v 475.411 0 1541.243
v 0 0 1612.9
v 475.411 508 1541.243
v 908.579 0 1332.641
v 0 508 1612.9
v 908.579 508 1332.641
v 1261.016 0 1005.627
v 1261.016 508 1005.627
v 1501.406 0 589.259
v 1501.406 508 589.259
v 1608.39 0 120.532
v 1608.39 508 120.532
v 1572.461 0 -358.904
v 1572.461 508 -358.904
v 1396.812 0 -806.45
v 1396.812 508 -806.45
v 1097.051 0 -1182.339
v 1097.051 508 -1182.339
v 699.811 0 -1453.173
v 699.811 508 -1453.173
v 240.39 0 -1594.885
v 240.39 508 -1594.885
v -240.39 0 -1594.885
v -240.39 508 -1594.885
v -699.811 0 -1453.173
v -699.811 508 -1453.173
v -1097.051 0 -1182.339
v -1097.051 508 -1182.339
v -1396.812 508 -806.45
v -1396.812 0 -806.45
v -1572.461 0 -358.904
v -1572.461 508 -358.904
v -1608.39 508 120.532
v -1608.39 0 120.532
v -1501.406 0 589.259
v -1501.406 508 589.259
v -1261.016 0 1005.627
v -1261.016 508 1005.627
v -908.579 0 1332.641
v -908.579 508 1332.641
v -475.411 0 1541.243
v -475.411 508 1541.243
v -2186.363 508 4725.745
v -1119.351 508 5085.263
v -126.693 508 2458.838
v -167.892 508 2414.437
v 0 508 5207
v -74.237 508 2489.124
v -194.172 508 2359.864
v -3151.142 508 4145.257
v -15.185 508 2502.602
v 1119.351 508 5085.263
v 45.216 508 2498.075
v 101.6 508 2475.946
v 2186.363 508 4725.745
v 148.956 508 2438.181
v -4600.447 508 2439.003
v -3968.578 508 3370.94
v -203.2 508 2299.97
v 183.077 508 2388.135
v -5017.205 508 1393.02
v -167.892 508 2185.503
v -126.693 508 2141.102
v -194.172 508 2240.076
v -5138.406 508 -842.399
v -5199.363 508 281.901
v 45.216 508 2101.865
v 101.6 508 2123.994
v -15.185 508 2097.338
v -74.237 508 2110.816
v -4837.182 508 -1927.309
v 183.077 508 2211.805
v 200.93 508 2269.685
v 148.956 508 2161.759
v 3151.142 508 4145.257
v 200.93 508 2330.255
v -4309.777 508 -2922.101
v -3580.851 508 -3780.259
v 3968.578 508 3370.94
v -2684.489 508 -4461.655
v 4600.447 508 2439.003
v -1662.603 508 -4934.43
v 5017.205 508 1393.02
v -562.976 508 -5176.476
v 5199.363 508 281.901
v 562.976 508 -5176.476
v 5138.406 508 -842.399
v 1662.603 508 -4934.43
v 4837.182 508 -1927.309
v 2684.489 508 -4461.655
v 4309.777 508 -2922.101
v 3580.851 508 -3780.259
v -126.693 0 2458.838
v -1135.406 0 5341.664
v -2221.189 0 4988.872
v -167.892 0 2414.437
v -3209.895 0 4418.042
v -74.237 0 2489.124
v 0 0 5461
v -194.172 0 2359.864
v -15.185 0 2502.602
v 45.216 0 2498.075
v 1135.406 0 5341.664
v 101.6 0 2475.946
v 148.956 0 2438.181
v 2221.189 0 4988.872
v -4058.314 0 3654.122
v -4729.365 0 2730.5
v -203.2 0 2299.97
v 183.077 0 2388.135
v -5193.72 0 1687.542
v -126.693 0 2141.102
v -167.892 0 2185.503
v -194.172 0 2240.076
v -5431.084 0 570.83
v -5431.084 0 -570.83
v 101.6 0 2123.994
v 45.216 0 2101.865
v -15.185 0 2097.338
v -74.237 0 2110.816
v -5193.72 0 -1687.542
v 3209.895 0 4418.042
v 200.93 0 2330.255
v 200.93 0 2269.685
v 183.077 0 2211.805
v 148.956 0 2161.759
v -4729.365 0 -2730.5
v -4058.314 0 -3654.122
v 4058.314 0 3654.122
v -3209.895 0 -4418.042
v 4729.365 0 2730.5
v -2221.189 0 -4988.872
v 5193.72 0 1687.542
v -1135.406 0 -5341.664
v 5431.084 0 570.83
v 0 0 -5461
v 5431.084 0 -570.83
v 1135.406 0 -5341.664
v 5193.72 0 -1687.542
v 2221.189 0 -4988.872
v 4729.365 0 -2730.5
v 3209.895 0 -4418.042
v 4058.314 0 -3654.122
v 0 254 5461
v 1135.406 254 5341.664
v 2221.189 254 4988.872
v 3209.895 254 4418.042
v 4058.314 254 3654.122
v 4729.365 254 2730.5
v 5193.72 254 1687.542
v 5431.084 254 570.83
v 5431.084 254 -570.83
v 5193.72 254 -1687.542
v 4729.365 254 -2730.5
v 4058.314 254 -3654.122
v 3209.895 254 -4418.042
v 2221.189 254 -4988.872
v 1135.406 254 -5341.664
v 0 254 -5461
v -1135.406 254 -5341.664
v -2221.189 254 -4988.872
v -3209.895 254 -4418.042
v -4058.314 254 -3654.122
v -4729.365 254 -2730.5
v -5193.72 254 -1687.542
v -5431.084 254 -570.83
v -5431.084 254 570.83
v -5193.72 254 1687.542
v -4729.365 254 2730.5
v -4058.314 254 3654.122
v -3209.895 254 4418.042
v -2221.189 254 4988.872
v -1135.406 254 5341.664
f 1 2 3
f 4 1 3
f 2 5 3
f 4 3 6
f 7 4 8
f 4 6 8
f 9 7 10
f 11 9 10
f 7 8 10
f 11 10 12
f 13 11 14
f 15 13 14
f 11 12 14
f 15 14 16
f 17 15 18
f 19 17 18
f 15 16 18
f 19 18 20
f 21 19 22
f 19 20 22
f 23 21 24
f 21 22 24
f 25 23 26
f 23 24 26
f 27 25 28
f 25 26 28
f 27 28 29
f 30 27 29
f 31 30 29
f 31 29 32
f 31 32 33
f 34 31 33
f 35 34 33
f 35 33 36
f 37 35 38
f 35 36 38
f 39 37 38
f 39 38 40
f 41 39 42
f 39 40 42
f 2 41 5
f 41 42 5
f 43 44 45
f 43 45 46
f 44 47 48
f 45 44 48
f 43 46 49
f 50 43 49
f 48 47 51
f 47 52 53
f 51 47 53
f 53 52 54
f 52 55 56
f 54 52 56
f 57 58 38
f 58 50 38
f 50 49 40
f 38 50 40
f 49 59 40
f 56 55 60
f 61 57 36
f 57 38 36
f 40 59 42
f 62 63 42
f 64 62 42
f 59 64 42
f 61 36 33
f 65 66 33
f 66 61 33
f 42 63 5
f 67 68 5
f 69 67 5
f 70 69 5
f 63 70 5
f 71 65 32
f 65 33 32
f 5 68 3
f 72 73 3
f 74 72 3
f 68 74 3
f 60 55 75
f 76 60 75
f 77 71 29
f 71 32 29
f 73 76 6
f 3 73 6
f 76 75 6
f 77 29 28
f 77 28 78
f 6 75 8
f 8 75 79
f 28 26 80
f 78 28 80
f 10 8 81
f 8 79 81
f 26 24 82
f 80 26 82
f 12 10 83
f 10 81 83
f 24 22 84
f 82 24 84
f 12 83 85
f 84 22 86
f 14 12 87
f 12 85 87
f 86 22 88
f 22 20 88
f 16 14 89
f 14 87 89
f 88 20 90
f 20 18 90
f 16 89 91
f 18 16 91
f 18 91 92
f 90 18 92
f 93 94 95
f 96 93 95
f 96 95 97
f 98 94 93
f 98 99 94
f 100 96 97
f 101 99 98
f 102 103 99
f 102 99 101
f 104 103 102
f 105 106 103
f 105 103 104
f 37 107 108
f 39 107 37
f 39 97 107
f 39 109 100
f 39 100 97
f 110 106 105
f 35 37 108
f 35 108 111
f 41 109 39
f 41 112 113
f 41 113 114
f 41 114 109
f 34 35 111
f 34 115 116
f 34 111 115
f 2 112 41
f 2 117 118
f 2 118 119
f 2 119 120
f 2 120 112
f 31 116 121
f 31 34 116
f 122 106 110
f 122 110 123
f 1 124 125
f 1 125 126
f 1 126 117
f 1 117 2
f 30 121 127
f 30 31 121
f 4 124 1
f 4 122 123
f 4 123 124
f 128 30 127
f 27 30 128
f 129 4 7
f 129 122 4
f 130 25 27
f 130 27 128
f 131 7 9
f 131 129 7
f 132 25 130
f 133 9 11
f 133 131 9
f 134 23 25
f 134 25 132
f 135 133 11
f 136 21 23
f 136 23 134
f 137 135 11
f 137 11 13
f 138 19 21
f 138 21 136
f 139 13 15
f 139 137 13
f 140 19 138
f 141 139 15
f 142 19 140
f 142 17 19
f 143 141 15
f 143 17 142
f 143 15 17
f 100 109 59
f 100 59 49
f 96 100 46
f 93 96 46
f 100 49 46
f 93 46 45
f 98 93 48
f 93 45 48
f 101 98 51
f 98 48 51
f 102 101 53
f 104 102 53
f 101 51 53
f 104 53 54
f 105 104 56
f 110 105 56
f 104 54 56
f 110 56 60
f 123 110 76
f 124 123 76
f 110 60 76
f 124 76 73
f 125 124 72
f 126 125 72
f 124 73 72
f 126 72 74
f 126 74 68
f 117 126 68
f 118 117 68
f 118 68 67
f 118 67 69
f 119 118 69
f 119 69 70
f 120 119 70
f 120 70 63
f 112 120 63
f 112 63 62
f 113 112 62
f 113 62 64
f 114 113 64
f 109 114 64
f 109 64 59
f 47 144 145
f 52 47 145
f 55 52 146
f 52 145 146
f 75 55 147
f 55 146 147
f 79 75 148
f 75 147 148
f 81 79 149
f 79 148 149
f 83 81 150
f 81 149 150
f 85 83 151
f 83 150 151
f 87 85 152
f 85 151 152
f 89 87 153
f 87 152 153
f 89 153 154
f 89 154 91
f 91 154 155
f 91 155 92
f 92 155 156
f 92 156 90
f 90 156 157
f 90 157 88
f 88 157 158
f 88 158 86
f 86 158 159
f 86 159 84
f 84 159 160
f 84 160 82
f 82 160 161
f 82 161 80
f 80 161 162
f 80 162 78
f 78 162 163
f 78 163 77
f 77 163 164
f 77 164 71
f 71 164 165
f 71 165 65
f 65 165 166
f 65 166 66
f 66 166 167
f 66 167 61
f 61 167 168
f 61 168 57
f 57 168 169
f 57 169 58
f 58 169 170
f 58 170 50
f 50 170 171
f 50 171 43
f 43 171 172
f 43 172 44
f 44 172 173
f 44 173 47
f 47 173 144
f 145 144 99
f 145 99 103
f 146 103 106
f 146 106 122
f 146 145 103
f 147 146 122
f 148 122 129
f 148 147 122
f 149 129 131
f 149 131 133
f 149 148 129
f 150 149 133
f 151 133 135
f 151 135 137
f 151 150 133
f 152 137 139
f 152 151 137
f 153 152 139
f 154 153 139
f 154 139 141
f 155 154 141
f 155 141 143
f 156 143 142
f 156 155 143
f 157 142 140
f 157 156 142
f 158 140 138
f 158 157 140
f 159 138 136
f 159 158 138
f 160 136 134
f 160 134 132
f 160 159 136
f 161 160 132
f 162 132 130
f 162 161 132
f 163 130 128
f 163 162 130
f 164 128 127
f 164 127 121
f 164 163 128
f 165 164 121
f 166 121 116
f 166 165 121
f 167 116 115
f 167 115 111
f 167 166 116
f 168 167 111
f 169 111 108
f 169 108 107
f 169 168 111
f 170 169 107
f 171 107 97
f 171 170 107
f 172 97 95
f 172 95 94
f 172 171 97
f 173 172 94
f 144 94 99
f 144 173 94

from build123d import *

# Parameters (mm, degrees)
F0_W     = 508
F0_H     = 3848.1
F2_SIZE  = 254
F3_R     = 203.2
F4_DEPTH = 508.001


with BuildPart() as f1:
    # F0 (on Right) → F1 (revolve)
    with BuildSketch(Plane.YZ):
        with Locations((254, 3536.95)):
            Rectangle(F0_W, F0_H)
    revolve(axis=Axis((0, 349.275798, 0), (0, 1, 0)))

    # F2
    f2_edges = [f1.edges().sort_by_distance(p)[0] for p in [
        (0, 508, -5461),
    ]]
    chamfer(f2_edges, length=F2_SIZE)

    # F3 (on face) → F4 (cut, through all)
    with BuildSketch(Plane(origin=(0, 508, 0), x_dir=(-1, 0, 0), z_dir=(0, 1, 0))):
        with Locations((0, 2299.97)):
            Circle(F3_R)
    extrude(amount=-F4_DEPTH, mode=Mode.SUBTRACT)


solid = f1.part
